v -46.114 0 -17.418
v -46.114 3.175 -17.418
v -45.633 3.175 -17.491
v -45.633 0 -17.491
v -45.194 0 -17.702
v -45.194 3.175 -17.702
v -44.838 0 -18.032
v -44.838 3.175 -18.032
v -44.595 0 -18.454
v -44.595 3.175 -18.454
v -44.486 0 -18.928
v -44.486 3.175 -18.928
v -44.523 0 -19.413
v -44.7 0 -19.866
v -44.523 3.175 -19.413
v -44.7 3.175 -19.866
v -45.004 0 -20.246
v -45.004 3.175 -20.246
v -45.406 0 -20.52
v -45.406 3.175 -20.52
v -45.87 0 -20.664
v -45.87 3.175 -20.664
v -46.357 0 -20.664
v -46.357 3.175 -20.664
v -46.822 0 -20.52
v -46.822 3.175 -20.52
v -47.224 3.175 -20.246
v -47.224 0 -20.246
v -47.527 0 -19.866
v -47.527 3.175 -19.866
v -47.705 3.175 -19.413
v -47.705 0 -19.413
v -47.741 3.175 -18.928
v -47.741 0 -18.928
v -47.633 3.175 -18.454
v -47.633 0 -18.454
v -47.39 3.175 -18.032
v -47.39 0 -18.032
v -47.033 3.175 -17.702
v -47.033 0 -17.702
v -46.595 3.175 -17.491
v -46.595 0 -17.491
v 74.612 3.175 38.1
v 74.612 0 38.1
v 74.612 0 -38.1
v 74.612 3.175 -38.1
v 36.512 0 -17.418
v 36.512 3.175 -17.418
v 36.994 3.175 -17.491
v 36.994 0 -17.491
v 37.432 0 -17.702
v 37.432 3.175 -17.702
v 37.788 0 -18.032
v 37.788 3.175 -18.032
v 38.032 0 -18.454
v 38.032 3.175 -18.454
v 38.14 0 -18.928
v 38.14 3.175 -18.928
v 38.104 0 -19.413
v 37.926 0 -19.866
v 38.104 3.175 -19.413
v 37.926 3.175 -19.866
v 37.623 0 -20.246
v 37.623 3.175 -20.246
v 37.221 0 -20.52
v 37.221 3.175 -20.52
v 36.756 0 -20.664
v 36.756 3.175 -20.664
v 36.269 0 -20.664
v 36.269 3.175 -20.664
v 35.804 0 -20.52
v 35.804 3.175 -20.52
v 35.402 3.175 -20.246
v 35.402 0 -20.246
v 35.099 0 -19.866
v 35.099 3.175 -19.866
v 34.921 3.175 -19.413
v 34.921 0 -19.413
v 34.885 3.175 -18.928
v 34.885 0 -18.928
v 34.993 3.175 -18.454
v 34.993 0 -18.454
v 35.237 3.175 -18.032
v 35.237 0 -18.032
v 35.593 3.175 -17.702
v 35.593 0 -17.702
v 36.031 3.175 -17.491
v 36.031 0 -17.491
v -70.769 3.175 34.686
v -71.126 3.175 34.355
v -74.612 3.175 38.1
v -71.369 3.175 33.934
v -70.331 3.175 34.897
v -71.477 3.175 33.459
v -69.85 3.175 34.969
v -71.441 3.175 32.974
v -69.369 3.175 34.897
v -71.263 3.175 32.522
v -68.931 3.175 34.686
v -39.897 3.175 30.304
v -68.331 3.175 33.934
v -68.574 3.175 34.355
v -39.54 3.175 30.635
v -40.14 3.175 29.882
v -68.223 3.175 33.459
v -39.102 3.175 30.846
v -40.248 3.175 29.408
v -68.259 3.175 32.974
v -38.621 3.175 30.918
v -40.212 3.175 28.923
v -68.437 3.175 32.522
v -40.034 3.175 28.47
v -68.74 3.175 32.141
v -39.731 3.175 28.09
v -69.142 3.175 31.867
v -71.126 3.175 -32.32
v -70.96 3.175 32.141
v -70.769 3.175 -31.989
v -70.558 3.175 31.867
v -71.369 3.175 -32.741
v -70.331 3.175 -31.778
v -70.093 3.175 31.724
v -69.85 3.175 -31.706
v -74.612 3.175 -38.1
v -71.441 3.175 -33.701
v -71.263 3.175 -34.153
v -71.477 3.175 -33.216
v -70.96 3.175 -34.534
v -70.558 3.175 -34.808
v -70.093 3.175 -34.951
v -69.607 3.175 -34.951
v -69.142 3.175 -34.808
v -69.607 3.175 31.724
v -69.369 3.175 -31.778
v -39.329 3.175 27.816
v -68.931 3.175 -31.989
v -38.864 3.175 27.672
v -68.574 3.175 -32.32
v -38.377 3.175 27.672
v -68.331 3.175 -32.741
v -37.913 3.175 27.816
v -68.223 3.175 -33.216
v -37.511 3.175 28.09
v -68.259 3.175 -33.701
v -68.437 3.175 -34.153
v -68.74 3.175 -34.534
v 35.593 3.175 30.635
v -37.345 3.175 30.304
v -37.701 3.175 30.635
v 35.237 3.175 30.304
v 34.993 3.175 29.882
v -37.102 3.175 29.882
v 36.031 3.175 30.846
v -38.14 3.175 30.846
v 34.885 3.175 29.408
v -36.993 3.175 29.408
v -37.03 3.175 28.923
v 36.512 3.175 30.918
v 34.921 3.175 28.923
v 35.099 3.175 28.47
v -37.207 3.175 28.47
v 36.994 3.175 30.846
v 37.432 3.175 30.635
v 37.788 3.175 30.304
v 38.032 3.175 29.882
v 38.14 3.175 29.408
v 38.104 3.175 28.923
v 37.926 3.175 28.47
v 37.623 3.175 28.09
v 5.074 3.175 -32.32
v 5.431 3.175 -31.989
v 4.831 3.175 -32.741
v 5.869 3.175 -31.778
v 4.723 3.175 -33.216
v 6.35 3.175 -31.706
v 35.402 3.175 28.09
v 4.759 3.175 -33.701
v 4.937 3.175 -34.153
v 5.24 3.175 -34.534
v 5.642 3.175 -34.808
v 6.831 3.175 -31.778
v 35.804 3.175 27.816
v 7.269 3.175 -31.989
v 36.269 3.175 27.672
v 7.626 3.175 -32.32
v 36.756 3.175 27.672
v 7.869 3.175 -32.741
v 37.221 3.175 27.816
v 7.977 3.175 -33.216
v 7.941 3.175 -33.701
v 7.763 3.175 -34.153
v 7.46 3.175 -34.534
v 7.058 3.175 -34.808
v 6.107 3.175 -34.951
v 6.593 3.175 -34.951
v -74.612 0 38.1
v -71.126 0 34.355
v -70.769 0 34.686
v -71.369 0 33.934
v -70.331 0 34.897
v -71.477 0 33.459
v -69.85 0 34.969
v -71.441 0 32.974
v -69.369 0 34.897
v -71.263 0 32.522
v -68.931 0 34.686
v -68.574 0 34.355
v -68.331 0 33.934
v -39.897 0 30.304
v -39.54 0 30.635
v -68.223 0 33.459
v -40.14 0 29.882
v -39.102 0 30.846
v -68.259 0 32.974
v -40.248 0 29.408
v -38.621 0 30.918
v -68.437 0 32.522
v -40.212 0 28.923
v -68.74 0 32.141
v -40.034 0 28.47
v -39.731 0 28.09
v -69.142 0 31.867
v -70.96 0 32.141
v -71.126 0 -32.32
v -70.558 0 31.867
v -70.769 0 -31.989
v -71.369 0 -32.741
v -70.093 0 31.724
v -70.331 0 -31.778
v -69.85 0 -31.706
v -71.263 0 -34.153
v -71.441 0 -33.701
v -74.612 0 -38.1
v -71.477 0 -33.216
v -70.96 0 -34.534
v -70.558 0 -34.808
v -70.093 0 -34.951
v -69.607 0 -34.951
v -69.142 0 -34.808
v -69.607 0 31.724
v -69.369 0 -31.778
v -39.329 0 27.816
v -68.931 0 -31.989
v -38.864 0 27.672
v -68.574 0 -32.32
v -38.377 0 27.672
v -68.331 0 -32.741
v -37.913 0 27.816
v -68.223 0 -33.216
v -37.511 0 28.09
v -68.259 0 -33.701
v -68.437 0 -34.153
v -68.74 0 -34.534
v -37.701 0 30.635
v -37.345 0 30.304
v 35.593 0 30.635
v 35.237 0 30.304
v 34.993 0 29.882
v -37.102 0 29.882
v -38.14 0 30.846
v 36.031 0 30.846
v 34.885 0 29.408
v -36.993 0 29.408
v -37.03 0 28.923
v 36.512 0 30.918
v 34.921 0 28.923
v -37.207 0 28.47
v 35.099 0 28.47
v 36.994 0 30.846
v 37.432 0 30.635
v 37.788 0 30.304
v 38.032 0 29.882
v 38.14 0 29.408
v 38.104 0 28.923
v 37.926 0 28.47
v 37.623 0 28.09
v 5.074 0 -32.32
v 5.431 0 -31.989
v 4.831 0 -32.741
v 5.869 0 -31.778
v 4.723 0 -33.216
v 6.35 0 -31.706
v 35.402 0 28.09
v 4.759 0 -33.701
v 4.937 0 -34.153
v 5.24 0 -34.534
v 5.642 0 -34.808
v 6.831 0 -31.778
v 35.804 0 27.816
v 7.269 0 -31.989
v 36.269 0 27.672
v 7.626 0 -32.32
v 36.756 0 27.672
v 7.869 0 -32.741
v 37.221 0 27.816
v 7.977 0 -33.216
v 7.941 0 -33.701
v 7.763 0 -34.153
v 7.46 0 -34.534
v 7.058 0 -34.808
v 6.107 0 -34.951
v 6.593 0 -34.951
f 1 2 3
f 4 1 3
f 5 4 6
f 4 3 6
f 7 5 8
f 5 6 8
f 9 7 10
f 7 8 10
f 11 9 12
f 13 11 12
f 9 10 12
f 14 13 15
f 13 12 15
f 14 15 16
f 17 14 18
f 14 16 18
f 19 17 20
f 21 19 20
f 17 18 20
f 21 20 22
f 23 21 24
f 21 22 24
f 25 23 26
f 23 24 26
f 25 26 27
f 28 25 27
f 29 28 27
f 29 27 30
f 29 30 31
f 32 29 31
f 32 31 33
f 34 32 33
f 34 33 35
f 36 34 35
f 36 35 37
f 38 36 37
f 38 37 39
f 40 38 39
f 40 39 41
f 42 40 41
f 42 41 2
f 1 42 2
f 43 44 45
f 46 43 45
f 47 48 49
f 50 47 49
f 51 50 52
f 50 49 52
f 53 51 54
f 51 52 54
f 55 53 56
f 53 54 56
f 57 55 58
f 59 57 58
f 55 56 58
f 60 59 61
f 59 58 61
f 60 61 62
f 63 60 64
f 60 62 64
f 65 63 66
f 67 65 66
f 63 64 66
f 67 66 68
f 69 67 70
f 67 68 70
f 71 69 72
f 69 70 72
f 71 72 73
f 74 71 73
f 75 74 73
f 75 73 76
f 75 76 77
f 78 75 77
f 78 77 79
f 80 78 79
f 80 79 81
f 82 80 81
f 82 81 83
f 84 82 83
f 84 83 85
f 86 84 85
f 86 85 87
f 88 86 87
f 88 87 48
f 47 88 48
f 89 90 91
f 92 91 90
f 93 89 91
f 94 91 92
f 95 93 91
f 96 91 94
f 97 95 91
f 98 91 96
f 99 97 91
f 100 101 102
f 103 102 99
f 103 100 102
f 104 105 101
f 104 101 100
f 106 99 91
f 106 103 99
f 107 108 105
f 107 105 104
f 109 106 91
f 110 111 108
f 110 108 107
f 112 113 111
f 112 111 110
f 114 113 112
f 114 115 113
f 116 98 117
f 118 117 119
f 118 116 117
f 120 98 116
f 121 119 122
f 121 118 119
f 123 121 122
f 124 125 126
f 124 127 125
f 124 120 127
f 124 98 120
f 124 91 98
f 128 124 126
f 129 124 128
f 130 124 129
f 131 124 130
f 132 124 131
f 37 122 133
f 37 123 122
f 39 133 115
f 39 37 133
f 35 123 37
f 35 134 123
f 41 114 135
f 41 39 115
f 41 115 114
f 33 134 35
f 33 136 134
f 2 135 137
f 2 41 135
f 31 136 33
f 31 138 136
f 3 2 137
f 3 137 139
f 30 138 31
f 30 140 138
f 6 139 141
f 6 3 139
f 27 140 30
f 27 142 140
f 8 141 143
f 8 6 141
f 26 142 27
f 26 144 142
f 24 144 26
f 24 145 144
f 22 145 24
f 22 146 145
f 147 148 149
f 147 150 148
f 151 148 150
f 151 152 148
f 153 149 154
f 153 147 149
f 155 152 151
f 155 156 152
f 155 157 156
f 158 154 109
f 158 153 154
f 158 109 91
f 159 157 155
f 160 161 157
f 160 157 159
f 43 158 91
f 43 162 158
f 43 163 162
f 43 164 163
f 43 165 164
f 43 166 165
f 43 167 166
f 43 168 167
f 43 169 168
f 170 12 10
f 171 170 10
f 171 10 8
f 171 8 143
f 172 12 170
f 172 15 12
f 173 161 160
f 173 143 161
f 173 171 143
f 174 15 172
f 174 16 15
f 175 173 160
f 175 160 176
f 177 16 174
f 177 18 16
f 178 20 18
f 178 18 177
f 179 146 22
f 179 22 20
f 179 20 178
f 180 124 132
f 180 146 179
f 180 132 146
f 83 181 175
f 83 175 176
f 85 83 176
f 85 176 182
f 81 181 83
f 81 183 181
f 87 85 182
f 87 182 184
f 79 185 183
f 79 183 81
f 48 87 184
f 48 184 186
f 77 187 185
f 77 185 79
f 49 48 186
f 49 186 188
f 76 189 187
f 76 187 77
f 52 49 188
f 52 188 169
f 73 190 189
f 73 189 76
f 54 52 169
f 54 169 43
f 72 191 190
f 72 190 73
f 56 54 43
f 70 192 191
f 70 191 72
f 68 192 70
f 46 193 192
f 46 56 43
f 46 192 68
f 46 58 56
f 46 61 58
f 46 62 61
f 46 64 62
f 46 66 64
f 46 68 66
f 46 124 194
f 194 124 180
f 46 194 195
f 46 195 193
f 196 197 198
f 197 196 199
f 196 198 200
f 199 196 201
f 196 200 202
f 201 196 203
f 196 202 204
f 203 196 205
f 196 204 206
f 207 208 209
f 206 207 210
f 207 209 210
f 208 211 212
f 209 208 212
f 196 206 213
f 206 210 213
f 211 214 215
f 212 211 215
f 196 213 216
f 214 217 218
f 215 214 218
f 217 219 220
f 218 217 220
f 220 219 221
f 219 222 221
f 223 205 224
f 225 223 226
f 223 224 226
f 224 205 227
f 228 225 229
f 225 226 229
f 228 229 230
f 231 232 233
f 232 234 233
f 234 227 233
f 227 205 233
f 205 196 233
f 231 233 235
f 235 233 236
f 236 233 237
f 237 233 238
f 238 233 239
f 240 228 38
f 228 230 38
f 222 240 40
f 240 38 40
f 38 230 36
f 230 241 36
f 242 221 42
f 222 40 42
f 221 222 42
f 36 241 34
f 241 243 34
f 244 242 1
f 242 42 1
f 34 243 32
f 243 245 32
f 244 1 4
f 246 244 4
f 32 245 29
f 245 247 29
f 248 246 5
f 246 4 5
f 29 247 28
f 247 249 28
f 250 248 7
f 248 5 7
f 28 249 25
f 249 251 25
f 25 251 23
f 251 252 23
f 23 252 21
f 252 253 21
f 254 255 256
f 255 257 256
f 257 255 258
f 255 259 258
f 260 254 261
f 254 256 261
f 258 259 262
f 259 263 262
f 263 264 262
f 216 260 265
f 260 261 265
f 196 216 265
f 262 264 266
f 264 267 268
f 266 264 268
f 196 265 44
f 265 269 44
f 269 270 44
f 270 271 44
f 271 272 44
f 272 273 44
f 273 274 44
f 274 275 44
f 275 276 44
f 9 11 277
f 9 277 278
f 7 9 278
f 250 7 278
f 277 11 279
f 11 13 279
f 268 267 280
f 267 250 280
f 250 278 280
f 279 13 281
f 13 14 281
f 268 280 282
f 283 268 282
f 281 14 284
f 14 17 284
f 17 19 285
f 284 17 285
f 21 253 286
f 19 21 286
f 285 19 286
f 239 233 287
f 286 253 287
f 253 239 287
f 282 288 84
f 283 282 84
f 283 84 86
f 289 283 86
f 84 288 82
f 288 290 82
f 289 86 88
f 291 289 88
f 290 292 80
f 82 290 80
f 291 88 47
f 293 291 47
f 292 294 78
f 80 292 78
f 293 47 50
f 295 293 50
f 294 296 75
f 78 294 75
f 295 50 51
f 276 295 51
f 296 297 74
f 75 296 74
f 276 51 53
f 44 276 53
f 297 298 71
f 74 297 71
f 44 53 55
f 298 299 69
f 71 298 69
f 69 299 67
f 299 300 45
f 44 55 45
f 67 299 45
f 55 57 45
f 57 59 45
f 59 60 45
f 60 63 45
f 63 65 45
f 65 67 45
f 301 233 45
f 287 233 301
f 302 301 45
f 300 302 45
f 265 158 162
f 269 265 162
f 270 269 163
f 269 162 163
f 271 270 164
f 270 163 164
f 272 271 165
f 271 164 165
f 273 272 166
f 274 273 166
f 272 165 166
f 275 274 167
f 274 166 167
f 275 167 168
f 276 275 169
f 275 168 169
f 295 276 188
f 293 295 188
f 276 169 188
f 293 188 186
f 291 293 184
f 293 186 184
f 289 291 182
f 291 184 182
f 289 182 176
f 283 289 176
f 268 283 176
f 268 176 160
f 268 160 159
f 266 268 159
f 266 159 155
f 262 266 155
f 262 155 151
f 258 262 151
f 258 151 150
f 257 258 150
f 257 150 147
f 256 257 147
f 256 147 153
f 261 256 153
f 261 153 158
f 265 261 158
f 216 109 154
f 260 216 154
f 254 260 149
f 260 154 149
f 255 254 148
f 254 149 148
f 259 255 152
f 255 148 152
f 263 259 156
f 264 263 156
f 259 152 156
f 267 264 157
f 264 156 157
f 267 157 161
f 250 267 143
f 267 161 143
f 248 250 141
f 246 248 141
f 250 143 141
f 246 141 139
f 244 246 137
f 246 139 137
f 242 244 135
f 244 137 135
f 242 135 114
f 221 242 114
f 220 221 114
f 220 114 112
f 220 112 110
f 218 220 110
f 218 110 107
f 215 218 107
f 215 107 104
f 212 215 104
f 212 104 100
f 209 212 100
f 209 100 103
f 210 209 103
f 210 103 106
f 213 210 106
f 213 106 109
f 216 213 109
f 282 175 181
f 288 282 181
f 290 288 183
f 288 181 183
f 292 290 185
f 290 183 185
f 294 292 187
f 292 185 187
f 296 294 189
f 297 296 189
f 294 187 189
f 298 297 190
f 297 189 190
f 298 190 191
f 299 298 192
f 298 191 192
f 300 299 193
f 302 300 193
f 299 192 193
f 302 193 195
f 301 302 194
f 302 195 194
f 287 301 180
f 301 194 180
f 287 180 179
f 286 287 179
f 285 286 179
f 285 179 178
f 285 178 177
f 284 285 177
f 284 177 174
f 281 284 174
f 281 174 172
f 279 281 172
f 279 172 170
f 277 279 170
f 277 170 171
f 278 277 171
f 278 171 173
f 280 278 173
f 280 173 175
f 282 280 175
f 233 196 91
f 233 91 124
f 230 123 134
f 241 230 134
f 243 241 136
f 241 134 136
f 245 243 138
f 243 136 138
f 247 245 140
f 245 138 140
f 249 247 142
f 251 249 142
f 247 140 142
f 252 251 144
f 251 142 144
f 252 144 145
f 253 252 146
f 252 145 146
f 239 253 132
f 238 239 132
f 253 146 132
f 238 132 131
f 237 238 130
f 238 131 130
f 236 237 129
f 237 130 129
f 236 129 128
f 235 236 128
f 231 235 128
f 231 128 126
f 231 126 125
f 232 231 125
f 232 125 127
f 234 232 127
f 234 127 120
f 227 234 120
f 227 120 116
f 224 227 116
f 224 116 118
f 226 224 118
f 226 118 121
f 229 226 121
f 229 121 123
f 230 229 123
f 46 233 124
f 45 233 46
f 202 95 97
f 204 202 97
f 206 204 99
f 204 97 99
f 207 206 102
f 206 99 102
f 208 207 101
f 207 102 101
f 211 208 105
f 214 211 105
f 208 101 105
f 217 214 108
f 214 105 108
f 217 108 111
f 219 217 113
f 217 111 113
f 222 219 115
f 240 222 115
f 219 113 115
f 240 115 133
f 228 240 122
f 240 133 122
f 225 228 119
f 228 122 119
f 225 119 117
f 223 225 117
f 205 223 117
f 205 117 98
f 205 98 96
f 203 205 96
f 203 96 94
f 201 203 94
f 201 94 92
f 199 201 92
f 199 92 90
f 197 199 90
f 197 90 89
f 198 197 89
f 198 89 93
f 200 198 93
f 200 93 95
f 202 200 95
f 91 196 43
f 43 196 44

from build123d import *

# Parameters (mm, degrees)
BASE_SKETCH_W                              = 149.225
BASE_SKETCH_H                              = 76.2
BASE_PLATE_DEPTH                           = 3.175
F_4_40_GUIDE_RAIL_HOLES_REACH              = 85.837
F_4_40_HOLE_PATTERN_SKETCH_GUIDE_RAIL_R    = 1.63195
F_4_40_ARDUINO_HOLES_REACH                 = 85.837
F_4_40_HOLE_PATTERN_SKETCH_ARDUINO_HOLES_R = 1.63195


with BuildPart() as part:
    # Base Sketch → Base Plate (new body)
    with BuildSketch(Plane(origin=(0, 0, 0), x_dir=(1, 0, 0), z_dir=(0, 1, 0))):
        Rectangle(BASE_SKETCH_W, BASE_SKETCH_H)
    extrude(amount=BASE_PLATE_DEPTH)

    # 4-40 Hole Pattern Sketch (Guide Rail) → 4-40 Guide Rail Holes (cut, up to next)
    with BuildSketch(Plane(origin=(0, 3.175, 0), x_dir=(1, 0, 0), z_dir=(0, 1, 0)), mode=Mode.PRIVATE) as f_4_40_guide_rail_holes_sk1:
        with Locations(Location((-69.85, 33.3375, 0), (0, 0, 270))):
            Circle(F_4_40_HOLE_PATTERN_SKETCH_GUIDE_RAIL_R)
    f_4_40_guide_rail_holes_tool1 = extrude(f_4_40_guide_rail_holes_sk1.sketch, amount=-F_4_40_GUIDE_RAIL_HOLES_REACH, mode=Mode.PRIVATE) & part.part
    # 4-40 Hole Pattern Sketch (Guide Rail) → 4-40 Guide Rail Holes (cut, up to next)
    with BuildSketch(Plane(origin=(0, 3.175, 0), x_dir=(1, 0, 0), z_dir=(0, 1, 0)), mode=Mode.PRIVATE) as f_4_40_guide_rail_holes_sk2:
        with Locations(Location((-69.85, -33.3375, 0), (0, 0, 270))):
            Circle(F_4_40_HOLE_PATTERN_SKETCH_GUIDE_RAIL_R)
    f_4_40_guide_rail_holes_tool2 = extrude(f_4_40_guide_rail_holes_sk2.sketch, amount=-F_4_40_GUIDE_RAIL_HOLES_REACH, mode=Mode.PRIVATE) & part.part
    # 4-40 Hole Pattern Sketch (Guide Rail) → 4-40 Guide Rail Holes (cut, up to next)
    with BuildSketch(Plane(origin=(0, 3.175, 0), x_dir=(1, 0, 0), z_dir=(0, 1, 0)), mode=Mode.PRIVATE) as f_4_40_guide_rail_holes_sk3:
        with Locations(Location((6.35, 33.3375, 0), (0, 0, 270))):
            Circle(F_4_40_HOLE_PATTERN_SKETCH_GUIDE_RAIL_R)
    f_4_40_guide_rail_holes_tool3 = extrude(f_4_40_guide_rail_holes_sk3.sketch, amount=-F_4_40_GUIDE_RAIL_HOLES_REACH, mode=Mode.PRIVATE) & part.part
    add(f_4_40_guide_rail_holes_tool1.solids().sort_by_distance((-69.85, 3.175, -33.3375))[0], mode=Mode.SUBTRACT)
    add(f_4_40_guide_rail_holes_tool2.solids().sort_by_distance((-69.85, 3.175, 33.3375))[0], mode=Mode.SUBTRACT)
    add(f_4_40_guide_rail_holes_tool3.solids().sort_by_distance((6.35, 3.175, -33.3375))[0], mode=Mode.SUBTRACT)

    # 4-40 Hole Pattern Sketch (Arduino Holes) → 4-40 Arduino Holes (cut, up to next)
    with BuildSketch(Plane(origin=(0, 3.175, 0), x_dir=(1, 0, 0), z_dir=(0, 1, 0)), mode=Mode.PRIVATE) as f_4_40_arduino_holes_sk1:
        with Locations(Location((-46.1137, 19.05, 0), (0, 0, 270))):
            Circle(F_4_40_HOLE_PATTERN_SKETCH_ARDUINO_HOLES_R)
    f_4_40_arduino_holes_tool1 = extrude(f_4_40_arduino_holes_sk1.sketch, amount=-F_4_40_ARDUINO_HOLES_REACH, mode=Mode.PRIVATE) & part.part
    # 4-40 Hole Pattern Sketch (Arduino Holes) → 4-40 Arduino Holes (cut, up to next)
    with BuildSketch(Plane(origin=(0, 3.175, 0), x_dir=(1, 0, 0), z_dir=(0, 1, 0)), mode=Mode.PRIVATE) as f_4_40_arduino_holes_sk2:
        with Locations(Location((-38.6207, -29.2862, 0), (0, 0, 270))):
            Circle(F_4_40_HOLE_PATTERN_SKETCH_ARDUINO_HOLES_R)
    f_4_40_arduino_holes_tool2 = extrude(f_4_40_arduino_holes_sk2.sketch, amount=-F_4_40_ARDUINO_HOLES_REACH, mode=Mode.PRIVATE) & part.part
    # 4-40 Hole Pattern Sketch (Arduino Holes) → 4-40 Arduino Holes (cut, up to next)
    with BuildSketch(Plane(origin=(0, 3.175, 0), x_dir=(1, 0, 0), z_dir=(0, 1, 0)), mode=Mode.PRIVATE) as f_4_40_arduino_holes_sk3:
        with Locations(Location((36.5125, 19.05, 0), (0, 0, 270))):
            Circle(F_4_40_HOLE_PATTERN_SKETCH_ARDUINO_HOLES_R)
    f_4_40_arduino_holes_tool3 = extrude(f_4_40_arduino_holes_sk3.sketch, amount=-F_4_40_ARDUINO_HOLES_REACH, mode=Mode.PRIVATE) & part.part
    # 4-40 Hole Pattern Sketch (Arduino Holes) → 4-40 Arduino Holes (cut, up to next)
    with BuildSketch(Plane(origin=(0, 3.175, 0), x_dir=(1, 0, 0), z_dir=(0, 1, 0)), mode=Mode.PRIVATE) as f_4_40_arduino_holes_sk4:
        with Locations(Location((36.5125, -29.2862, 0), (0, 0, 270))):
            Circle(F_4_40_HOLE_PATTERN_SKETCH_ARDUINO_HOLES_R)
    f_4_40_arduino_holes_tool4 = extrude(f_4_40_arduino_holes_sk4.sketch, amount=-F_4_40_ARDUINO_HOLES_REACH, mode=Mode.PRIVATE) & part.part
    add(f_4_40_arduino_holes_tool1.solids().sort_by_distance((-46.1137, 3.175, -19.05))[0], mode=Mode.SUBTRACT)
    add(f_4_40_arduino_holes_tool2.solids().sort_by_distance((-38.6207, 3.175, 29.2862))[0], mode=Mode.SUBTRACT)
    add(f_4_40_arduino_holes_tool3.solids().sort_by_distance((36.5125, 3.175, -19.05))[0], mode=Mode.SUBTRACT)
    add(f_4_40_arduino_holes_tool4.solids().sort_by_distance((36.5125, 3.175, 29.2862))[0], mode=Mode.SUBTRACT)


solid = part.part
